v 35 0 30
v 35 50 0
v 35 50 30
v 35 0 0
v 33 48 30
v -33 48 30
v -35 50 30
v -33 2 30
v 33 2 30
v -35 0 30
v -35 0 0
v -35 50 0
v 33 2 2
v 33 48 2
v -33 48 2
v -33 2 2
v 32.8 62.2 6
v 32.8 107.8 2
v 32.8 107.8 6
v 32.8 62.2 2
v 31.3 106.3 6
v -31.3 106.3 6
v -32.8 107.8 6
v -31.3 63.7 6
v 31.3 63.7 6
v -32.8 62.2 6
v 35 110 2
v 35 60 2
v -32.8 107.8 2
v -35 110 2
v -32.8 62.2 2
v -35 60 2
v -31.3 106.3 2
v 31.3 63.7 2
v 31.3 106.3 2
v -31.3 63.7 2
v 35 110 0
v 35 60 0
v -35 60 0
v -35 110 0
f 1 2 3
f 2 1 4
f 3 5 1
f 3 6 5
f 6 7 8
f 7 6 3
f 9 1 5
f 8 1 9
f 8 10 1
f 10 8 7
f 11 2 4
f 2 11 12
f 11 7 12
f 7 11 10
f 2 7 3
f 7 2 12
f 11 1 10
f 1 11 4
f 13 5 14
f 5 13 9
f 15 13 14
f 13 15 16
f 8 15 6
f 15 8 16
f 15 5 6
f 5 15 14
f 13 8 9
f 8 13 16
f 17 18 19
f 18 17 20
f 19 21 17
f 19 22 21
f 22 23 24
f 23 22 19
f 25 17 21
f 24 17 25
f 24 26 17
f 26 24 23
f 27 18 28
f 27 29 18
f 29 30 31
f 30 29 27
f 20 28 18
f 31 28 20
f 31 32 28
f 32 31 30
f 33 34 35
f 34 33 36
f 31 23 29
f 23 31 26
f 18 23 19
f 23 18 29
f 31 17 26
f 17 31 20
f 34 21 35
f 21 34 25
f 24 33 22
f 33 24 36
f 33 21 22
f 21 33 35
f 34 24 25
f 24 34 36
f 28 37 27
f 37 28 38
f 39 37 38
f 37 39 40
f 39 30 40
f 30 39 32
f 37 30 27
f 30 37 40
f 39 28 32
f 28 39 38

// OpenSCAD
$fn = 64;

// ===== DIMENSIONS =====

// Box (Part 1)
box_outer_x = 70;    // Outer X dimension
box_outer_y = 50;    // Outer Y dimension
box_outer_z = 30;    // Outer Z dimension
wall_thick = 2;      // Wall thickness
floor_thick = 2;     // Floor thickness

// Lid (Part 2)
lid_base_x = 70;     // Base X dimension
lid_base_y = 50;     // Base Y dimension
lid_base_z = 2;      // Base thickness
rim_outer_x = 65.6;  // Rim outer X
rim_outer_y = 45.6;  // Rim outer Y
rim_thick = 1.5;     // Rim wall thickness
rim_height = 4;      // Rim height above base

// Spacing
gap = 10;            // Gap between parts on bed for printing

// ===== MODULES =====

// Box (Part 1) - centered on X, positioned at y=0
module box() {
    difference() {
        // Solid outer box
        translate([-box_outer_x/2, 0, 0])
        cube([box_outer_x, box_outer_y, box_outer_z]);
        
        // Inner cavity (open top) - extends 0.5mm beyond for clean cut
        translate([-box_outer_x/2 + wall_thick, 
                   wall_thick, 
                   floor_thick])
        cube([box_outer_x - 2*wall_thick, 
              box_outer_y - 2*wall_thick, 
              box_outer_z - floor_thick + 0.5]);
    }
}

// Lid (Part 2) - centered on X, positioned at y = 50+gap
module lid() {
    lid_y_pos = box_outer_y + gap;
    
    // Base plate
    translate([-lid_base_x/2, lid_y_pos, 0])
    cube([lid_base_x, lid_base_y, lid_base_z]);
    
    // Rim with inner opening
    rim_inner_x = rim_outer_x - 2*rim_thick;
    rim_inner_y = rim_outer_y - 2*rim_thick;
    offset_x = (lid_base_x - rim_outer_x) / 2;
    offset_y = (lid_base_y - rim_outer_y) / 2;
    
    difference() {
        // Solid rim
        translate([-lid_base_x/2 + offset_x, 
                   lid_y_pos + offset_y, 
                   lid_base_z])
        cube([rim_outer_x, rim_outer_y, rim_height]);
        
        // Inner opening - extends 0.5mm below and 1mm above for clean cut
        translate([-lid_base_x/2 + offset_x + rim_thick, 
                   lid_y_pos + offset_y + rim_thick, 
                   lid_base_z - 0.5])
        cube([rim_inner_x, rim_inner_y, rim_height + 1]);
    }
}

// ===== RENDERING =====

box();
lid();
